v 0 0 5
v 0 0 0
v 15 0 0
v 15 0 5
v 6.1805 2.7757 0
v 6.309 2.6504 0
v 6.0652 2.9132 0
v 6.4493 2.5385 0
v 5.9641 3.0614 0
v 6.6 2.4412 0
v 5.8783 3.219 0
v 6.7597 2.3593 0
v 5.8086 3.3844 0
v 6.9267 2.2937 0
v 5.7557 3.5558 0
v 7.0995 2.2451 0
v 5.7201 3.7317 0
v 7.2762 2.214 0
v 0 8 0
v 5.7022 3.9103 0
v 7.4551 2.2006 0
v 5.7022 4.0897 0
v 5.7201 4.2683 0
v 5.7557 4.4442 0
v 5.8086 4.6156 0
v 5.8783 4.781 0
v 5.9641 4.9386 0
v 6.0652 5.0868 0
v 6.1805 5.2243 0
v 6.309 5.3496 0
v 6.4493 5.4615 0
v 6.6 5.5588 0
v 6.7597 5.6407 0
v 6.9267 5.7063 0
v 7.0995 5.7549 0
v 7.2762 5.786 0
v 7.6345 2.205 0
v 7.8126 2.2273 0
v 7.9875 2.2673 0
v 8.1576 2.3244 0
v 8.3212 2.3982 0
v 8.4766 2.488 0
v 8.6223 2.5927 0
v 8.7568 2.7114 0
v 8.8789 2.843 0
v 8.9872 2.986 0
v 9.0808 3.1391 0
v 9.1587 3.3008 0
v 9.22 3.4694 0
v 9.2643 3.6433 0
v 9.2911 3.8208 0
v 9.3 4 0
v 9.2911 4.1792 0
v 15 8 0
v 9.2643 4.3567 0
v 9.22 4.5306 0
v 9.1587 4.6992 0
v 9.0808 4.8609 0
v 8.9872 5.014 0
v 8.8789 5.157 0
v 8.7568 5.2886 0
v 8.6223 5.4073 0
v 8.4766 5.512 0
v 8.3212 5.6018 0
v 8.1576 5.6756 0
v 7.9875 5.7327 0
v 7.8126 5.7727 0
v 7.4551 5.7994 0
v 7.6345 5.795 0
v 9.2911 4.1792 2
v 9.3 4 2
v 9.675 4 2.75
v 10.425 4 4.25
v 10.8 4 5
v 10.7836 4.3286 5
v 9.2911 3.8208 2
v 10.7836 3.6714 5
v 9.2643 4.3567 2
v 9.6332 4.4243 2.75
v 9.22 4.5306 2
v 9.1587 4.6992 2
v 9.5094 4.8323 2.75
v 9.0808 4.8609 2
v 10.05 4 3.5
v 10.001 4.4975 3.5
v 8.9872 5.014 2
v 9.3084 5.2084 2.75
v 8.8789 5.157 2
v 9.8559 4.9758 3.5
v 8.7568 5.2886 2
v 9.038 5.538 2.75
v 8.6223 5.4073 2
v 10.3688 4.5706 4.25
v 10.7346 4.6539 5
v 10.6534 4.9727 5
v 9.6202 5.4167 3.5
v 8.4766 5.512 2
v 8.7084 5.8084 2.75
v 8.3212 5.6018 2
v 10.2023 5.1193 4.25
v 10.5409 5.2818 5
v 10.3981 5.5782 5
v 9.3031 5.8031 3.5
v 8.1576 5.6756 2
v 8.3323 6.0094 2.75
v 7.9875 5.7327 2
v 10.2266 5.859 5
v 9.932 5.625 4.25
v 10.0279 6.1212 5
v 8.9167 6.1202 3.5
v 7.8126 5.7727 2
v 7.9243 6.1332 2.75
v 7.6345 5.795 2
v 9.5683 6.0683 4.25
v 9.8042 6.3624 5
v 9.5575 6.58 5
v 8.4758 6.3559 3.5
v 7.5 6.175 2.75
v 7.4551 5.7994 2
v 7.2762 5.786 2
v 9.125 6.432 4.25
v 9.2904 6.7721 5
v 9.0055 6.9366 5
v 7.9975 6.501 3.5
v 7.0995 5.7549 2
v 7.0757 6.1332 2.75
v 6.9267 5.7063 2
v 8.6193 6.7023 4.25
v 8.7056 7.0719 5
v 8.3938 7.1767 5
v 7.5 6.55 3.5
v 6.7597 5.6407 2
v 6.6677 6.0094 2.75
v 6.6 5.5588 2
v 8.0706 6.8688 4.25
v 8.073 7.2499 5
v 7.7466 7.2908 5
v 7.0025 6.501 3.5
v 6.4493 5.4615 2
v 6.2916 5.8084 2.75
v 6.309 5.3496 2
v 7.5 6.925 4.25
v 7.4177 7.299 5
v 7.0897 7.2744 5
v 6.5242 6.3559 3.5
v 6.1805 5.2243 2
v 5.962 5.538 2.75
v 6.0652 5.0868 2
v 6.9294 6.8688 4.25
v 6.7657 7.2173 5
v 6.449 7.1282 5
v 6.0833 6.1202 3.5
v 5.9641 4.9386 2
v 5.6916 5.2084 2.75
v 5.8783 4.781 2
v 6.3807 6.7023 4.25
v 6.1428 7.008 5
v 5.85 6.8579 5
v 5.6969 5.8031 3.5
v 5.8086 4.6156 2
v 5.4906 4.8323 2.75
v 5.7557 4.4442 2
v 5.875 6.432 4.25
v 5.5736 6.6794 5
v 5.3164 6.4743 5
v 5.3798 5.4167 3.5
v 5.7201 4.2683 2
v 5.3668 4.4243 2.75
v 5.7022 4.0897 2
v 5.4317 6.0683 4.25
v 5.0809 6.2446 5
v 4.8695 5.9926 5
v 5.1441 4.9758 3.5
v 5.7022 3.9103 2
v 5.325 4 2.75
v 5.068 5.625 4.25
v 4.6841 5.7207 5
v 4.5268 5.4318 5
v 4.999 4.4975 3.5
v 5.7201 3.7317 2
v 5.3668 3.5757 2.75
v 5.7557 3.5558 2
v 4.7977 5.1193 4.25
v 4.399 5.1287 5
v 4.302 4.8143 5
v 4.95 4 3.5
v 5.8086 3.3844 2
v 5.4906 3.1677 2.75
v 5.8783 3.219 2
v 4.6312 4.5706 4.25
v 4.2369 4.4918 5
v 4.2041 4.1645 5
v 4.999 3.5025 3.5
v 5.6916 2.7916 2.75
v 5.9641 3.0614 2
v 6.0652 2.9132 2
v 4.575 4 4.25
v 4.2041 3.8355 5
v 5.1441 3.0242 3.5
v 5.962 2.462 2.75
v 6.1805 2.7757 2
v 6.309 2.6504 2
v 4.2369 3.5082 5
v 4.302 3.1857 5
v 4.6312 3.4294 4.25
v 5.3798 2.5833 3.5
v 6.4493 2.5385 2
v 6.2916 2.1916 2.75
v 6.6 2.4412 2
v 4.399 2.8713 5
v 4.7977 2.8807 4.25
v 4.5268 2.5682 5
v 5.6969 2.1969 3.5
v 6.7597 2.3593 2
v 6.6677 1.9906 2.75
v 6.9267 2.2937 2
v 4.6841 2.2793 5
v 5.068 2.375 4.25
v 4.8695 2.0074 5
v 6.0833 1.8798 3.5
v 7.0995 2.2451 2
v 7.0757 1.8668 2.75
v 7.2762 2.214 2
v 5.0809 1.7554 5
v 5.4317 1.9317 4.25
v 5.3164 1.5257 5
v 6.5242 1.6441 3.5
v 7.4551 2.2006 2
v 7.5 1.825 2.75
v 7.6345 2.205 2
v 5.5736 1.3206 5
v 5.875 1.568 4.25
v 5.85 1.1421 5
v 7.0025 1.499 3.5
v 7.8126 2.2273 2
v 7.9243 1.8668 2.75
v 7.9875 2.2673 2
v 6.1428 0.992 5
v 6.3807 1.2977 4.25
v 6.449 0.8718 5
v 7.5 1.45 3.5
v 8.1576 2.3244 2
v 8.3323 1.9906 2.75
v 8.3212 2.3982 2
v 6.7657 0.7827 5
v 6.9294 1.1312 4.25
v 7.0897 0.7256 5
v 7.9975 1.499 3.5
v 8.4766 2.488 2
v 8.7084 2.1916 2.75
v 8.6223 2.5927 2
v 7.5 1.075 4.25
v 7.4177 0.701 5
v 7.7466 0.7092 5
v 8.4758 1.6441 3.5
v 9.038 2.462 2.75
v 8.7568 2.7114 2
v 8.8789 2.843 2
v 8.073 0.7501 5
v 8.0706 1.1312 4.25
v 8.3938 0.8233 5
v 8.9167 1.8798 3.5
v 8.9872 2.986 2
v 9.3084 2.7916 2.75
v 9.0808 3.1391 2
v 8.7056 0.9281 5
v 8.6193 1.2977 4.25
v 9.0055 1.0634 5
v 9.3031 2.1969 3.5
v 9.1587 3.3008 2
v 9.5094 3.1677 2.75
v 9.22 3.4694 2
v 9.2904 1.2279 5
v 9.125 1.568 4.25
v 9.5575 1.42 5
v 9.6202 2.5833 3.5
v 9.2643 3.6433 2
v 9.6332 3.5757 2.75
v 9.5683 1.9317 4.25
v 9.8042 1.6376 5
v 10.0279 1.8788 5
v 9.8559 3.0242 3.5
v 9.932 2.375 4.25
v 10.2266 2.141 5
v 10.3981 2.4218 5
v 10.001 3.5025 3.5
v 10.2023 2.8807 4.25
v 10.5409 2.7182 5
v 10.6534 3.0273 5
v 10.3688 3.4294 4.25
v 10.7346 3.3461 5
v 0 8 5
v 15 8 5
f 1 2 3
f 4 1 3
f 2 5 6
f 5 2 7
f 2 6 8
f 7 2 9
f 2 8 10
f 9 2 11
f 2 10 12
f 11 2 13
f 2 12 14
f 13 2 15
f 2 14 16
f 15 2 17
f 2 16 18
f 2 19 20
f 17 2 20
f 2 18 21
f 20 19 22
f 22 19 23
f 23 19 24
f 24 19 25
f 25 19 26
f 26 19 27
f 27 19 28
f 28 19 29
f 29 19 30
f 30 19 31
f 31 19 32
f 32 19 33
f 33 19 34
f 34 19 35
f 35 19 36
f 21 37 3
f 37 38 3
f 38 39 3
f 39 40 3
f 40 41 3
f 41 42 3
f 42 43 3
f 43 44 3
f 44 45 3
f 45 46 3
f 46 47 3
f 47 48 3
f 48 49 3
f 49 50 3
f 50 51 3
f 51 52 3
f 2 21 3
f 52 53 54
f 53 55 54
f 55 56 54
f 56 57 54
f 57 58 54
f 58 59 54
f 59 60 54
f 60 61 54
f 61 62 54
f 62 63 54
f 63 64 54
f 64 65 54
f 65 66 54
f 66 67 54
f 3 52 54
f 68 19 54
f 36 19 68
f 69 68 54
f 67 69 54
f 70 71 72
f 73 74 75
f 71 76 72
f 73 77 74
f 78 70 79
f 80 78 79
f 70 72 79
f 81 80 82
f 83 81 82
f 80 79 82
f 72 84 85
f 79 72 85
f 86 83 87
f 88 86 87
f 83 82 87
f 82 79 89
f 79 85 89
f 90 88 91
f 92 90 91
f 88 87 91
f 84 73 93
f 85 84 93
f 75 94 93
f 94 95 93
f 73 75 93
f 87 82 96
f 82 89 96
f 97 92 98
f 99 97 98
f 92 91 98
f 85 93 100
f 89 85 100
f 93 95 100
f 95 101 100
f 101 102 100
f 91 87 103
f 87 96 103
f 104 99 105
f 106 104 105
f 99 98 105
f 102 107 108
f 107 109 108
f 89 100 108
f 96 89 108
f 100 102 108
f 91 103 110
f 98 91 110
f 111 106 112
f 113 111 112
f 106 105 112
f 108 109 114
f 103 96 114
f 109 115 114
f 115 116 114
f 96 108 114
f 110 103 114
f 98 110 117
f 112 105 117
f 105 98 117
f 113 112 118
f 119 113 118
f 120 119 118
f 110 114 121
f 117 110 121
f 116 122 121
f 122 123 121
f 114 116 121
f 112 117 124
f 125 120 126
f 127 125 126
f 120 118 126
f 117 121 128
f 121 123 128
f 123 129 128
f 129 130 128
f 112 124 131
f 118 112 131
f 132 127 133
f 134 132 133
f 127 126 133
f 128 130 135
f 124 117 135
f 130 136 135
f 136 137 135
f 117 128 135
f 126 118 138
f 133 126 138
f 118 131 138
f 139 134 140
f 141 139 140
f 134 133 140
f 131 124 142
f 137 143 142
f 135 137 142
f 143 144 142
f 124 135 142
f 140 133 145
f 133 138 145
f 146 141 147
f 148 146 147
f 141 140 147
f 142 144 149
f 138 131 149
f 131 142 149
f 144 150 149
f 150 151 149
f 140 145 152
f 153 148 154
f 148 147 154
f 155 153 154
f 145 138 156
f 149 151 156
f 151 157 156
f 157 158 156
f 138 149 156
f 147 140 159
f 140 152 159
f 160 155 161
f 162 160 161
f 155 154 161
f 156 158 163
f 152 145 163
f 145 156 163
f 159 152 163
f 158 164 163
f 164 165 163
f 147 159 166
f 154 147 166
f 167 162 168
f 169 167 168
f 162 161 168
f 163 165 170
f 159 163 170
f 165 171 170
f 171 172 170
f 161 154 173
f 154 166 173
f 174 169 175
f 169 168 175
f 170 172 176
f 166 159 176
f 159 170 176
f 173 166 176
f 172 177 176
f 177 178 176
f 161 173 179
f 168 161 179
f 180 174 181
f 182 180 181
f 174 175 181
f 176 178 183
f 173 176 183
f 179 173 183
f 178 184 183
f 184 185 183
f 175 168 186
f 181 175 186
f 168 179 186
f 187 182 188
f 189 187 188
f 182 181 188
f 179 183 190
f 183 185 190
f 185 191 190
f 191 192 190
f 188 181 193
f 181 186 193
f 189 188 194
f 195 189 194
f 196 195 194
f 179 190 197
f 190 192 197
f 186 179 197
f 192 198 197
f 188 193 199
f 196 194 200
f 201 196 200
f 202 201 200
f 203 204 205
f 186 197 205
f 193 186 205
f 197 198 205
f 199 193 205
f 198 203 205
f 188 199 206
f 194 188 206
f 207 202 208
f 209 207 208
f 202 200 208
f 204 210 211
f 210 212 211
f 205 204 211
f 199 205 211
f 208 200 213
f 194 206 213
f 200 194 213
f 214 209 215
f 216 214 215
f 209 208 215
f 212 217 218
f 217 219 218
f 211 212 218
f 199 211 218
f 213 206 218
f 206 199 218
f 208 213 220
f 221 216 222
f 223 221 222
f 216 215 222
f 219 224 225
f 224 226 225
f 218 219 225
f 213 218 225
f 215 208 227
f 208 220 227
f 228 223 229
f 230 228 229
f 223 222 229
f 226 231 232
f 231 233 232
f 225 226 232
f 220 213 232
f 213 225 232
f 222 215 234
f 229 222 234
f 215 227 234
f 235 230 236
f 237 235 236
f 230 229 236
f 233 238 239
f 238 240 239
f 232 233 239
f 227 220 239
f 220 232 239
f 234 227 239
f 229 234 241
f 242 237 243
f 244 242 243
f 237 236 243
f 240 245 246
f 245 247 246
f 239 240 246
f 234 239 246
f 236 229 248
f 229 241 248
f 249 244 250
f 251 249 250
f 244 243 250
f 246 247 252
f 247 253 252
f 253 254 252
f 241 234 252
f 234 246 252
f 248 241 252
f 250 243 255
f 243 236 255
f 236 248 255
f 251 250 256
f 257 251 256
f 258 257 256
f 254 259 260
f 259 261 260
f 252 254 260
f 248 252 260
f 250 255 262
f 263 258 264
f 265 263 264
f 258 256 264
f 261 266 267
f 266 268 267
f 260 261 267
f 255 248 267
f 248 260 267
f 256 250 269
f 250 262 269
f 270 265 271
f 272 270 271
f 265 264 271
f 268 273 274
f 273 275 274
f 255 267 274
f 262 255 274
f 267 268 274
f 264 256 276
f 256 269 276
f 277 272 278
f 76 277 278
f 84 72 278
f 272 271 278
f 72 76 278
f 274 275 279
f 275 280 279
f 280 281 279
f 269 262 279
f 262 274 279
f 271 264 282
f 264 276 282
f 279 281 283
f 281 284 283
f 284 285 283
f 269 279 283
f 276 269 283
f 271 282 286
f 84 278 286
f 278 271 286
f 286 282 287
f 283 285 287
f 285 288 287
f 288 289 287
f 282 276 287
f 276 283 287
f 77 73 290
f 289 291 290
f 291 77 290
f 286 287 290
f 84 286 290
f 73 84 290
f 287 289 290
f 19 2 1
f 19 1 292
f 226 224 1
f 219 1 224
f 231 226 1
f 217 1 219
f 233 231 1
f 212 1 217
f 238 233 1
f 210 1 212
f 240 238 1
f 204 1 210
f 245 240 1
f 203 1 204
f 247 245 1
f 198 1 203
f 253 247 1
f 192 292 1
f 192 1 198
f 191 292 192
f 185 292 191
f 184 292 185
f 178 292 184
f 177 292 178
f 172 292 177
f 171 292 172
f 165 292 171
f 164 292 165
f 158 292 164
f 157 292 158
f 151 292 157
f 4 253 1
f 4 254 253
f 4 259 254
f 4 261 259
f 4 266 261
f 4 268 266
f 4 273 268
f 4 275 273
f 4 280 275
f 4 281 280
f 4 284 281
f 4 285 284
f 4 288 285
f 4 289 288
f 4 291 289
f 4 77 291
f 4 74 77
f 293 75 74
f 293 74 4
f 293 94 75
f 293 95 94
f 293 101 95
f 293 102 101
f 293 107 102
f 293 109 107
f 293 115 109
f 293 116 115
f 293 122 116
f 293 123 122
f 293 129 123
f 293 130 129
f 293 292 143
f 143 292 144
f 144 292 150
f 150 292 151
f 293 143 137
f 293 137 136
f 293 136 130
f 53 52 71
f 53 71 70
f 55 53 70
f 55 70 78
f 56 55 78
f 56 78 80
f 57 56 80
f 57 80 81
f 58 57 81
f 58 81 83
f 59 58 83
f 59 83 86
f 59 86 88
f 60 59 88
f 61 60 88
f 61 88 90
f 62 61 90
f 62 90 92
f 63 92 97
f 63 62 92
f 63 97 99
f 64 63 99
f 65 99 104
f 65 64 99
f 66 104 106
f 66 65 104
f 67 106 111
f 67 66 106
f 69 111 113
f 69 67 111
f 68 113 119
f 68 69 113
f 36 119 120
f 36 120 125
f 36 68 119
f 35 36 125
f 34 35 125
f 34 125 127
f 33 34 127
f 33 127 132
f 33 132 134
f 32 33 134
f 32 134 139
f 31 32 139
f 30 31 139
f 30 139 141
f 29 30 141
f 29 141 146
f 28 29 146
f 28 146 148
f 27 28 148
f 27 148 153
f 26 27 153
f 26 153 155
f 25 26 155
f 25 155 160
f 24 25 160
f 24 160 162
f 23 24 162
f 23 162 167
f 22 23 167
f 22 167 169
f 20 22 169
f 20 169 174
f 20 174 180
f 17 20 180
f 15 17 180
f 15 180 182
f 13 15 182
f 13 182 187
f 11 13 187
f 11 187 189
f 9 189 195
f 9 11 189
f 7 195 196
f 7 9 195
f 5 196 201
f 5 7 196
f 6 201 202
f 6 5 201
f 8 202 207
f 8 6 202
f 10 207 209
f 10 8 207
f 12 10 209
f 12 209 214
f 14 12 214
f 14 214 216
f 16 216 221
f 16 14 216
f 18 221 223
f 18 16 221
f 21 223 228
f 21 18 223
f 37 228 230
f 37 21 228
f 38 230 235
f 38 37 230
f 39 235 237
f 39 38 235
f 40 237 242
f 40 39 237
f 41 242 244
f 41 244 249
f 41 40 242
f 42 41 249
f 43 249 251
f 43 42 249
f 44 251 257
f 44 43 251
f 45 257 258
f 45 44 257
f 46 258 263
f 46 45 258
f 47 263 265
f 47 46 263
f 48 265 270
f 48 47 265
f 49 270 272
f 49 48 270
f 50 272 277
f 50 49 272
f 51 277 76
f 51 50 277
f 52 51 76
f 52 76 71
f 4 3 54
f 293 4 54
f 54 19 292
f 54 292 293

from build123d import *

# Parameters (mm, degrees)
CYLINDER042_R     = 1.8
CYLINDER042_DEPTH = 10
BOX021_W          = 15
BOX021_H          = 8
BOX021_DEPTH      = 5


with BuildPart() as cylinder007:
    # Cylinder042 → Cylinder042 (new body)
    with BuildSketch(Plane(origin=(7.5, 4, 0), x_dir=(1, 0, 0), z_dir=(0, 0, 1))):
        Circle(CYLINDER042_R)
    extrude(amount=CYLINDER042_DEPTH)


with BuildPart() as fusion015:
    # Cone → Cone (revolve)
    with BuildSketch(Plane(origin=(7.5, 4, 2), x_dir=(1, 0, 0), z_dir=(0, -1, 0))):
        Polygon((0, 0), (1.8, 0), (3.3, 3), (0, 3), align=None)
    revolve(axis=Axis((7.5, 4, 2), (0, 0, 1)))

    # Fusion015: union Cylinder007
    add(cylinder007.part)


with BuildPart() as bottom_stop_trigger_cut:
    # Box021 → Box021 (new body)
    with BuildSketch(Plane.XY):
        with Locations((7.5, 4)):
            Rectangle(BOX021_W, BOX021_H)
    extrude(amount=BOX021_DEPTH)

    # Cut015: cut Fusion015
    add(fusion015.part, mode=Mode.SUBTRACT)


solid = bottom_stop_trigger_cut.part
